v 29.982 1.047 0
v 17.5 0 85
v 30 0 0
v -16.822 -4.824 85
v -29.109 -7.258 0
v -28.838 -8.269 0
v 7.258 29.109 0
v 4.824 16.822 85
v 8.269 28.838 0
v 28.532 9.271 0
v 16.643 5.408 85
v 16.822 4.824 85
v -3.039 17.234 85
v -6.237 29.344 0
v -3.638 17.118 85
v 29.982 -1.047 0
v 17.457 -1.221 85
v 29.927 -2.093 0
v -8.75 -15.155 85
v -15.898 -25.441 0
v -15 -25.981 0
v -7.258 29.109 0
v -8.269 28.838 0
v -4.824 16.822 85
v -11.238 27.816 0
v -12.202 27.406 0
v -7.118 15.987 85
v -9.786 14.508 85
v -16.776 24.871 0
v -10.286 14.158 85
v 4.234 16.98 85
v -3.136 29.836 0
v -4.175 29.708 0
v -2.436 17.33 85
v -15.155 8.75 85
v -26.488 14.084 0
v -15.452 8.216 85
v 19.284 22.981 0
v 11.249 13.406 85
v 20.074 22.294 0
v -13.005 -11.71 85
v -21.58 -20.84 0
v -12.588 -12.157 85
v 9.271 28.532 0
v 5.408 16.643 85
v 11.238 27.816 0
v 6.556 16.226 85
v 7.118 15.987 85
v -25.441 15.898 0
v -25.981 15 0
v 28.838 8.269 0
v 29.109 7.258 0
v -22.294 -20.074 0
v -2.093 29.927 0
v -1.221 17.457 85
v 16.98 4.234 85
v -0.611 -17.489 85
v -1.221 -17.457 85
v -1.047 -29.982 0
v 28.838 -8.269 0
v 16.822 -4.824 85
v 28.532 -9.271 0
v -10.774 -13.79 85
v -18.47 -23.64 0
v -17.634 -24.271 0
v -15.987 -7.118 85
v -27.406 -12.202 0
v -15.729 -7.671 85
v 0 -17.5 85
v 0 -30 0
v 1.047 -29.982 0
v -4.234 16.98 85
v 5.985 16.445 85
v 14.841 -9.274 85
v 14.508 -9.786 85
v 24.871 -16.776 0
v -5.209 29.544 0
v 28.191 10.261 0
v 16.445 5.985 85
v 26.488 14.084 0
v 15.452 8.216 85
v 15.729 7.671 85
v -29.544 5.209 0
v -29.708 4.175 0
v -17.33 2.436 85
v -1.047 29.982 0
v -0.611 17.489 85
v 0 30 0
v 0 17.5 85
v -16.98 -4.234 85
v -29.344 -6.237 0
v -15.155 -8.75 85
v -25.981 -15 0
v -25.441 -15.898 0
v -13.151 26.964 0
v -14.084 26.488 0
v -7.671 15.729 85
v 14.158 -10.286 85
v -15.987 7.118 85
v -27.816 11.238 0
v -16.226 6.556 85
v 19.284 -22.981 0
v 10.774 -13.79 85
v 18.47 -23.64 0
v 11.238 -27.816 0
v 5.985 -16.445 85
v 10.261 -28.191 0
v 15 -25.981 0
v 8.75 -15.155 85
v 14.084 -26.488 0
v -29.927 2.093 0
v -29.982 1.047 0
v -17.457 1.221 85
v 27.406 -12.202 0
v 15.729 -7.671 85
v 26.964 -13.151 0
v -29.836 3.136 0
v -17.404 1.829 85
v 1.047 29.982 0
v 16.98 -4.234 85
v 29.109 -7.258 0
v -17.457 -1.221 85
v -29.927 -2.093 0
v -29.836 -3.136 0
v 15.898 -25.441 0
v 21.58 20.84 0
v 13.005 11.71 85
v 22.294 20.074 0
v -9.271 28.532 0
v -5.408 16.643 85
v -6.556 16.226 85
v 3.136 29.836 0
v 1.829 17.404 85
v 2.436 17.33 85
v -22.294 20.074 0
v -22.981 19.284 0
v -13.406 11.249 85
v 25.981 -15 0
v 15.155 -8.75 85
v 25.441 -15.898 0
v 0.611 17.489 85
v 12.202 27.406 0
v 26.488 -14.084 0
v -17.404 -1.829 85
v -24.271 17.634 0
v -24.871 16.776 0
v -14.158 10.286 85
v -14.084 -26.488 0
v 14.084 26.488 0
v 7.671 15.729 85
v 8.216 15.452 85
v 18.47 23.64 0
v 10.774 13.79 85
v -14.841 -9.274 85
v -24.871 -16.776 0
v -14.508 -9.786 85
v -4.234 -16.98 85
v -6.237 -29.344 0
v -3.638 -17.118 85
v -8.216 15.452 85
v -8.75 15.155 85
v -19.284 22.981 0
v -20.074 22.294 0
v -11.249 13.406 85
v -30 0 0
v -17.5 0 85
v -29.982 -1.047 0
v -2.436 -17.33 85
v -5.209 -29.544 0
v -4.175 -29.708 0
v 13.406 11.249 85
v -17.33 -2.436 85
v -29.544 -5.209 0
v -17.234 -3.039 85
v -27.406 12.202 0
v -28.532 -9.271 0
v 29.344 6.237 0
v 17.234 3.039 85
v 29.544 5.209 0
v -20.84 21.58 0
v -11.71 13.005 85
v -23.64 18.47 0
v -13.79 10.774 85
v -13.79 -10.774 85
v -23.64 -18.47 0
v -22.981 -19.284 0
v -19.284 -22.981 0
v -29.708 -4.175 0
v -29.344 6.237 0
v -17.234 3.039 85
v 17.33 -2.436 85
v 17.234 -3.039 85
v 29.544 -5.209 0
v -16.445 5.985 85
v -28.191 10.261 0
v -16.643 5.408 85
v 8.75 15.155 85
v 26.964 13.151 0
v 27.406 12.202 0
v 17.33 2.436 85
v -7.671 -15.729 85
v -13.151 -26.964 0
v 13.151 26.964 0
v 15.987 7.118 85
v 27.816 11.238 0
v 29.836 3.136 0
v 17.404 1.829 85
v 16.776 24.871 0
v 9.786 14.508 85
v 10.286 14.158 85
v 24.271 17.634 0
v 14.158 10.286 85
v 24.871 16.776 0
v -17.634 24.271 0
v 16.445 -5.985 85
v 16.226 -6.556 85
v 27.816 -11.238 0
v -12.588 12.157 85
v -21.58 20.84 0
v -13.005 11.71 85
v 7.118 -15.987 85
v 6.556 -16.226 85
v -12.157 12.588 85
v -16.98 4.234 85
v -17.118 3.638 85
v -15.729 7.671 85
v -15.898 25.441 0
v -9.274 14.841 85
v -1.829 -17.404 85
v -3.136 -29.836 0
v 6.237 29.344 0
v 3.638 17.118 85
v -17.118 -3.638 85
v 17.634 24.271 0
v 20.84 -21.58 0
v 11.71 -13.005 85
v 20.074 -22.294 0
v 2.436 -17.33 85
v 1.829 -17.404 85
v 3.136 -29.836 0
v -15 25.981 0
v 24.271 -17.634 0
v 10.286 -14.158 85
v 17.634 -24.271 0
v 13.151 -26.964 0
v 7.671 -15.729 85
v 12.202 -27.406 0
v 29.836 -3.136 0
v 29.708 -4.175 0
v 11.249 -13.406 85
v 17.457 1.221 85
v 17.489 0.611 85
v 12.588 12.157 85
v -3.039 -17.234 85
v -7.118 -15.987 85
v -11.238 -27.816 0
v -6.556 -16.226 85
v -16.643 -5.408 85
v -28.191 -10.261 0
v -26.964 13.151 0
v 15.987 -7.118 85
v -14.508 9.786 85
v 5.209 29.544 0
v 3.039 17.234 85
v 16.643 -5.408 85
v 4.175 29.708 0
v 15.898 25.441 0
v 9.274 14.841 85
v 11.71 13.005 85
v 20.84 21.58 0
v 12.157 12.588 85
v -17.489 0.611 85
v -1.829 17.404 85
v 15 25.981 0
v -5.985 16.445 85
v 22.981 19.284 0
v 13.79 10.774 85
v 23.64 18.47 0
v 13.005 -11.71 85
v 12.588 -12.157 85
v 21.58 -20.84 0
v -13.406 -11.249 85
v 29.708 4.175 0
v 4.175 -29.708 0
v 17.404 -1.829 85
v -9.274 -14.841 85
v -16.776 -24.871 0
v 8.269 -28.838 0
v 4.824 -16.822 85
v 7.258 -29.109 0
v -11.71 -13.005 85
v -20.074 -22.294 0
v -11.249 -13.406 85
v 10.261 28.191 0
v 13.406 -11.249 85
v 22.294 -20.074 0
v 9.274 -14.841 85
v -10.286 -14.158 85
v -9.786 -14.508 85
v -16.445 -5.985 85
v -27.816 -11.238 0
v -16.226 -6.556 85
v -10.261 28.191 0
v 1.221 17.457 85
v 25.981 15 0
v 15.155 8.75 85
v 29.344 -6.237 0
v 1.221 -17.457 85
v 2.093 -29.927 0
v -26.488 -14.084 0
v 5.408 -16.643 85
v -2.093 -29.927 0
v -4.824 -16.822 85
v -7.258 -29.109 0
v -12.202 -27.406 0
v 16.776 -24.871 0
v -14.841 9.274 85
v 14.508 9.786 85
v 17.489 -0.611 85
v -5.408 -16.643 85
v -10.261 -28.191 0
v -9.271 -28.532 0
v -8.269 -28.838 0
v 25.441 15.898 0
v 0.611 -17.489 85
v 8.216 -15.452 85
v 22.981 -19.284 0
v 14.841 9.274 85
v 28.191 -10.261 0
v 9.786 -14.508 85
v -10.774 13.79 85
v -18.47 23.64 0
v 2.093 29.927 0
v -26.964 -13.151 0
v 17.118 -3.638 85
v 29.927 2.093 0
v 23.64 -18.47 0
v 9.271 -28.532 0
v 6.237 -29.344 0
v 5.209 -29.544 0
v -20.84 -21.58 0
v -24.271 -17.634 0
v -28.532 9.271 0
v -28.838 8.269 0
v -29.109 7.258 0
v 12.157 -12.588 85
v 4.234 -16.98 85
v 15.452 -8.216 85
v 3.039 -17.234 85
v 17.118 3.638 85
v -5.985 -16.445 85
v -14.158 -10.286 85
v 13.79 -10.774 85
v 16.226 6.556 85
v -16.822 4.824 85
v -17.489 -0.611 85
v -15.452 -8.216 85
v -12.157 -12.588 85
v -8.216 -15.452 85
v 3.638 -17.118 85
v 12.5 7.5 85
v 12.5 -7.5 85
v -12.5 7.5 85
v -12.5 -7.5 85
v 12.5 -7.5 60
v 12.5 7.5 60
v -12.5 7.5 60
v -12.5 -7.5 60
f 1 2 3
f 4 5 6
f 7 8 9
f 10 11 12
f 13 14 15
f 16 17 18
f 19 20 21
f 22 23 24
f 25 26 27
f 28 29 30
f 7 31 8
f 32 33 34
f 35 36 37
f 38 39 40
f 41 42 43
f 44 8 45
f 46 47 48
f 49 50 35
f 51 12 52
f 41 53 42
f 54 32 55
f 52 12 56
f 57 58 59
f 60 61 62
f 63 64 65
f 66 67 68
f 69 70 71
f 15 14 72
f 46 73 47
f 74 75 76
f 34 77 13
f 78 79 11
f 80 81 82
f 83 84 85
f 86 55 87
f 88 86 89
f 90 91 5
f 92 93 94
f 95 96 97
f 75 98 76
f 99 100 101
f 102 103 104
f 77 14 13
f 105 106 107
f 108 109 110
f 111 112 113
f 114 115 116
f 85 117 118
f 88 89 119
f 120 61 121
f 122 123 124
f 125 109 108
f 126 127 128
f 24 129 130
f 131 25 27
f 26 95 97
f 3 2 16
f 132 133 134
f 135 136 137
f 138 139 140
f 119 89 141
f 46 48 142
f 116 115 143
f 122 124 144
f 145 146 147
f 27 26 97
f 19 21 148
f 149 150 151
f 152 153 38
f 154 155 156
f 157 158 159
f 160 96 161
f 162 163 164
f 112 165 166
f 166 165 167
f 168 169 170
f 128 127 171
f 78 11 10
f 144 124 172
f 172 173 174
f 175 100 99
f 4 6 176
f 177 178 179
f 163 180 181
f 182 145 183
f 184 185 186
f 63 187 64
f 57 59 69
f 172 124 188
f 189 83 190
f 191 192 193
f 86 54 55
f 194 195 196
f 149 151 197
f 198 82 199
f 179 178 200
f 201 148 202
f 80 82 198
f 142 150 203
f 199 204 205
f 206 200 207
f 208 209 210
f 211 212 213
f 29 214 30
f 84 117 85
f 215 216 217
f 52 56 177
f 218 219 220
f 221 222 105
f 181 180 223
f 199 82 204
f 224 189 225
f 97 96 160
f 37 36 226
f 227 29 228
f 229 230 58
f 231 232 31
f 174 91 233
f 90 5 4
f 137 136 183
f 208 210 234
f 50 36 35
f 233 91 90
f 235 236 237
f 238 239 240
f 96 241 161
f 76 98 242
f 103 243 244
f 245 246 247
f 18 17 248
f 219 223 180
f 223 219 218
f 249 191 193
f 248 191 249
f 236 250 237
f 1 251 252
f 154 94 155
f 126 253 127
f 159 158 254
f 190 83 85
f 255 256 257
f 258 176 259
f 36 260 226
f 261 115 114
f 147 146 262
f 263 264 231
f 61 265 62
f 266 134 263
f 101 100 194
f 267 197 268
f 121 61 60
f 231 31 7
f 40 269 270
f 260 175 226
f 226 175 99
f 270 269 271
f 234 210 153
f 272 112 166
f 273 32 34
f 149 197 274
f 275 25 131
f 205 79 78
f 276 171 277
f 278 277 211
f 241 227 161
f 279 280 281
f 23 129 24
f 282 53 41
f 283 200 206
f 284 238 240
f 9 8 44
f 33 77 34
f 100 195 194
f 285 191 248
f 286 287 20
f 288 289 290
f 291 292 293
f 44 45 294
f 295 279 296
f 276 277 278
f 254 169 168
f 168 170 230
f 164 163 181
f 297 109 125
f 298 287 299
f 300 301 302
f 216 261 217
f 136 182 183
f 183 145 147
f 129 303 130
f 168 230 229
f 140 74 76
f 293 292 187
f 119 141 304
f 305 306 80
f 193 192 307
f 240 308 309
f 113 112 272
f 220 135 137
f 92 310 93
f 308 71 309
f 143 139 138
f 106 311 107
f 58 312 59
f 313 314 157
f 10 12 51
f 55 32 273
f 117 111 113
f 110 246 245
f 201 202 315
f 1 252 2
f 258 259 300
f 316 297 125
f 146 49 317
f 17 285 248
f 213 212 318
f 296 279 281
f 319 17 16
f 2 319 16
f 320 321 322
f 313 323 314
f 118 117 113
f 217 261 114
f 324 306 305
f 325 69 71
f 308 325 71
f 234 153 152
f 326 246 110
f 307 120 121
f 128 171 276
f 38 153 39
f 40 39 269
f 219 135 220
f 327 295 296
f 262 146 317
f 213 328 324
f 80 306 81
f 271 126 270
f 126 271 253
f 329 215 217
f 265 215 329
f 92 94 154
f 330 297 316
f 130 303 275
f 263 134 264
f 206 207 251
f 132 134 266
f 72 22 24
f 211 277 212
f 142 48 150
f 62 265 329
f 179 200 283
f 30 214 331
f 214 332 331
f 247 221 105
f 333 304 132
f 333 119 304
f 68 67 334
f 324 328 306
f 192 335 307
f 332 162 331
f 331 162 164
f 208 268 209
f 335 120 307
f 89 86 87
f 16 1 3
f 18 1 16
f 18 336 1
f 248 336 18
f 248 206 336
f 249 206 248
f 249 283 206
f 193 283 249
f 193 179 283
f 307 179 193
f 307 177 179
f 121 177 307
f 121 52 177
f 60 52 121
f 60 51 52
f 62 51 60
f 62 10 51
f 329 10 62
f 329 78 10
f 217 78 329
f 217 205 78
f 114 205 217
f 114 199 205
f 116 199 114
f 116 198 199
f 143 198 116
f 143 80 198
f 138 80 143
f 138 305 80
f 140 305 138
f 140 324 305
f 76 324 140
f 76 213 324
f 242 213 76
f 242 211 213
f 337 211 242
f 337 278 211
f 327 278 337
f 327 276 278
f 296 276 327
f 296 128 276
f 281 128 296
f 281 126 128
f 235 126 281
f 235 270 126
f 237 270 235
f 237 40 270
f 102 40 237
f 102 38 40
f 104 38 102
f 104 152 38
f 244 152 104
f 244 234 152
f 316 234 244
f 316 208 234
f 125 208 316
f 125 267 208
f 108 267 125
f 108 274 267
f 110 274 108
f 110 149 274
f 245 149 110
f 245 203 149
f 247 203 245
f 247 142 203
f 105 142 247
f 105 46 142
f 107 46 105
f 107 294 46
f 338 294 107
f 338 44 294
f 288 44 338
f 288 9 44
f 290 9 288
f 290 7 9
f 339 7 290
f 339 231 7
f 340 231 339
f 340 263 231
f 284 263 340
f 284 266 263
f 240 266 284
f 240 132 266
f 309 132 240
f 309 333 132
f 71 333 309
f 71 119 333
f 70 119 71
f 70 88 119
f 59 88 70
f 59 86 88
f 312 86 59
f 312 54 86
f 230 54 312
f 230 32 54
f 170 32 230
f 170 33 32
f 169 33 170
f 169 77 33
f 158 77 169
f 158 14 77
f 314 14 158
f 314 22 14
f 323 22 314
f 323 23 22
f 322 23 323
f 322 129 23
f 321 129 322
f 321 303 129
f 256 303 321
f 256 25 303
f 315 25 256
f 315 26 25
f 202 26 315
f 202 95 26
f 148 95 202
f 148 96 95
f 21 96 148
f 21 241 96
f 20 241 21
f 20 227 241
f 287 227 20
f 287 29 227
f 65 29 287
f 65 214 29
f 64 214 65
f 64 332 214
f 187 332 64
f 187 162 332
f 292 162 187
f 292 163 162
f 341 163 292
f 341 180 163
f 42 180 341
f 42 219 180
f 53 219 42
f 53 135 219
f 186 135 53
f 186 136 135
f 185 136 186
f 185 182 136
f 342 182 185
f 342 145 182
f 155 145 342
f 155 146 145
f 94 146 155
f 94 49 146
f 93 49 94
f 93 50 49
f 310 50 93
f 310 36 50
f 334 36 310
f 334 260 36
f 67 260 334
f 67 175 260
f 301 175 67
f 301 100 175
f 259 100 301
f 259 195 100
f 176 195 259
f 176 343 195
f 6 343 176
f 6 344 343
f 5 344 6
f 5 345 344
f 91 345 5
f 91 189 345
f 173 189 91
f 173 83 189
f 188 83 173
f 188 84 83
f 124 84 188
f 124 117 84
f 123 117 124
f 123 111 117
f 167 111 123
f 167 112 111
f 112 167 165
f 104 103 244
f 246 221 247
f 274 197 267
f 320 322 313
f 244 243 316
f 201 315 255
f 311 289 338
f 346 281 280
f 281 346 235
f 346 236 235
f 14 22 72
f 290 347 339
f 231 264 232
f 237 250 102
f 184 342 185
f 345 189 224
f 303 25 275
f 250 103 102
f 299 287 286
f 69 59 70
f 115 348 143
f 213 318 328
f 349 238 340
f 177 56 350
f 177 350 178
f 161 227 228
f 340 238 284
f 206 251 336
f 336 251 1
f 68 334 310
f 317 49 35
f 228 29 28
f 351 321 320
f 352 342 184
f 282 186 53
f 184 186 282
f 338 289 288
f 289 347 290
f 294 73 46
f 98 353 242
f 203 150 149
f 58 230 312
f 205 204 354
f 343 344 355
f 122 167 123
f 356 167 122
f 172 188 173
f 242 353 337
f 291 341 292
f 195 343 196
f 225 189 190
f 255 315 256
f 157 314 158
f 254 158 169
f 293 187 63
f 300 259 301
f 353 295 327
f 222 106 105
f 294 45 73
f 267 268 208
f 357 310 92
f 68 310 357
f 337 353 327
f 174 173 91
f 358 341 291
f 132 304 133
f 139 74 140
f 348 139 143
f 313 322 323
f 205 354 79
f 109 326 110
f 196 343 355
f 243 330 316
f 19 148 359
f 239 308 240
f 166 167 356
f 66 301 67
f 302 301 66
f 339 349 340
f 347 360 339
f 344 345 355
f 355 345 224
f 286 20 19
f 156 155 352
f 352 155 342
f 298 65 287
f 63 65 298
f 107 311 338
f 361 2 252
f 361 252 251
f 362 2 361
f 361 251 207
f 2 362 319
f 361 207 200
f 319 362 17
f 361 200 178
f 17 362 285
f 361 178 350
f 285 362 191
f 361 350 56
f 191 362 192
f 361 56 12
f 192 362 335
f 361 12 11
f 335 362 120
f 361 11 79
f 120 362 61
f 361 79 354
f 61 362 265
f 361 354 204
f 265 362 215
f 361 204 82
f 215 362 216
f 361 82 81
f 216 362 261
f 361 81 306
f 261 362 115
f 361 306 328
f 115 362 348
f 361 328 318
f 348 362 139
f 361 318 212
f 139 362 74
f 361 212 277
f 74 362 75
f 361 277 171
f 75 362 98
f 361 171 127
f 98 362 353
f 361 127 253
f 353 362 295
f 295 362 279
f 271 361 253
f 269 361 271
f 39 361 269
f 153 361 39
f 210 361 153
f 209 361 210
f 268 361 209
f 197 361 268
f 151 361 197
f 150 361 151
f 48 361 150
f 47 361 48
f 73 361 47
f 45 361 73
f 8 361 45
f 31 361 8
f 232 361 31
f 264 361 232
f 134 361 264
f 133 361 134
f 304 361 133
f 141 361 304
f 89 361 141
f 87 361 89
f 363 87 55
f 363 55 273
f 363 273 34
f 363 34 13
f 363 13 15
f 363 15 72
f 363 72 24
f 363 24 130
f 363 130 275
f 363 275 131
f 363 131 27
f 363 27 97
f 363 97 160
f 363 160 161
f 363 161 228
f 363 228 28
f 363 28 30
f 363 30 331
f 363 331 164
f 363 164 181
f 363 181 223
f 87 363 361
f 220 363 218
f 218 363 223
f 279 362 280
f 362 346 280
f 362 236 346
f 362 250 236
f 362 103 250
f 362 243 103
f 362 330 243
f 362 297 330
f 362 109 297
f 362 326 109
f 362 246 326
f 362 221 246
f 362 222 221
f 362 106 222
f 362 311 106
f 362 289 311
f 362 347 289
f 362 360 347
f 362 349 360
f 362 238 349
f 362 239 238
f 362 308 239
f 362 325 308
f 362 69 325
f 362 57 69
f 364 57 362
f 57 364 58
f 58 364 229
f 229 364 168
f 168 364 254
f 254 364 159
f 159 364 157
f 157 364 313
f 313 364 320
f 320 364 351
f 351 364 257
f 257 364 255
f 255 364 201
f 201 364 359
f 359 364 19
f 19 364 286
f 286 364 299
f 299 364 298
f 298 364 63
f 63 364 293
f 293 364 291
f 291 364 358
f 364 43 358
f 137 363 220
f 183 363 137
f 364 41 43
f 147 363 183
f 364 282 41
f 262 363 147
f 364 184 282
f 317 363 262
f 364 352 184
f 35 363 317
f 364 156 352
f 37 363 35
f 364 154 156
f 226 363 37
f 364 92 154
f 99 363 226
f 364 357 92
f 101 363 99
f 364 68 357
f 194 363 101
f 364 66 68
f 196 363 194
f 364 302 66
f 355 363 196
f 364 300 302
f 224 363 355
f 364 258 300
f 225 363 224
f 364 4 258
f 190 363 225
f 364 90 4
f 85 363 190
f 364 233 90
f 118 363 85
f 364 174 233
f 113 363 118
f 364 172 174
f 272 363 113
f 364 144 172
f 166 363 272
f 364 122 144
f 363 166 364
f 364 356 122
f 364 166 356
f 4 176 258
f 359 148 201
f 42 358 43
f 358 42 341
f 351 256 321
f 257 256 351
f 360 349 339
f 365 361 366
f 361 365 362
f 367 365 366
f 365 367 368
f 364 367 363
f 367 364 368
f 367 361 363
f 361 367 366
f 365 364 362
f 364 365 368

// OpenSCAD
$fn=180;
difference() {
cylinder(d1=60,d2=35,h=85);
translate([-25/2,-15/2,-25+85]) cube([25,15,25]);
}
